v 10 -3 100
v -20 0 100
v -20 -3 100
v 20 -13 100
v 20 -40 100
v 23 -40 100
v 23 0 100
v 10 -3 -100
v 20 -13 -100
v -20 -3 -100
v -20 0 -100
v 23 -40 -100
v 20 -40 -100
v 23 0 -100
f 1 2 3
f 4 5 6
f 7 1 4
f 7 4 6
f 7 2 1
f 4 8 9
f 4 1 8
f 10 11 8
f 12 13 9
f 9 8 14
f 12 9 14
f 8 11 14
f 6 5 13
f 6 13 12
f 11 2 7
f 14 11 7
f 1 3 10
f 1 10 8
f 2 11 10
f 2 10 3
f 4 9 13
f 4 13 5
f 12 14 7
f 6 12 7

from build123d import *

# Parameters (mm, degrees)
F0_W     = 40
F0_H     = 200
F1_DEPTH = 3
F2_W     = 3
F2_H     = 200
F3_DEPTH = 40
F5_DEPTH = 100


with BuildPart() as f1:
    # F0 (on Front) → F1 (new body)
    with BuildSketch(Plane.XZ):
        Rectangle(F0_W, F0_H)
    extrude(amount=F1_DEPTH)

    # F2 (on Front) → F3 (join)
    with BuildSketch(Plane.XZ):
        with Locations((21.5, 0)):
            Rectangle(F2_W, F2_H)
    extrude(amount=F3_DEPTH)

    # F4 (on Top) → F5 (join, symmetric)
    with BuildSketch(Plane.XY):
        Polygon((10, -3), (20, -13), (20, -3), align=None)
    extrude(amount=F5_DEPTH, both=True)


solid = f1.part
